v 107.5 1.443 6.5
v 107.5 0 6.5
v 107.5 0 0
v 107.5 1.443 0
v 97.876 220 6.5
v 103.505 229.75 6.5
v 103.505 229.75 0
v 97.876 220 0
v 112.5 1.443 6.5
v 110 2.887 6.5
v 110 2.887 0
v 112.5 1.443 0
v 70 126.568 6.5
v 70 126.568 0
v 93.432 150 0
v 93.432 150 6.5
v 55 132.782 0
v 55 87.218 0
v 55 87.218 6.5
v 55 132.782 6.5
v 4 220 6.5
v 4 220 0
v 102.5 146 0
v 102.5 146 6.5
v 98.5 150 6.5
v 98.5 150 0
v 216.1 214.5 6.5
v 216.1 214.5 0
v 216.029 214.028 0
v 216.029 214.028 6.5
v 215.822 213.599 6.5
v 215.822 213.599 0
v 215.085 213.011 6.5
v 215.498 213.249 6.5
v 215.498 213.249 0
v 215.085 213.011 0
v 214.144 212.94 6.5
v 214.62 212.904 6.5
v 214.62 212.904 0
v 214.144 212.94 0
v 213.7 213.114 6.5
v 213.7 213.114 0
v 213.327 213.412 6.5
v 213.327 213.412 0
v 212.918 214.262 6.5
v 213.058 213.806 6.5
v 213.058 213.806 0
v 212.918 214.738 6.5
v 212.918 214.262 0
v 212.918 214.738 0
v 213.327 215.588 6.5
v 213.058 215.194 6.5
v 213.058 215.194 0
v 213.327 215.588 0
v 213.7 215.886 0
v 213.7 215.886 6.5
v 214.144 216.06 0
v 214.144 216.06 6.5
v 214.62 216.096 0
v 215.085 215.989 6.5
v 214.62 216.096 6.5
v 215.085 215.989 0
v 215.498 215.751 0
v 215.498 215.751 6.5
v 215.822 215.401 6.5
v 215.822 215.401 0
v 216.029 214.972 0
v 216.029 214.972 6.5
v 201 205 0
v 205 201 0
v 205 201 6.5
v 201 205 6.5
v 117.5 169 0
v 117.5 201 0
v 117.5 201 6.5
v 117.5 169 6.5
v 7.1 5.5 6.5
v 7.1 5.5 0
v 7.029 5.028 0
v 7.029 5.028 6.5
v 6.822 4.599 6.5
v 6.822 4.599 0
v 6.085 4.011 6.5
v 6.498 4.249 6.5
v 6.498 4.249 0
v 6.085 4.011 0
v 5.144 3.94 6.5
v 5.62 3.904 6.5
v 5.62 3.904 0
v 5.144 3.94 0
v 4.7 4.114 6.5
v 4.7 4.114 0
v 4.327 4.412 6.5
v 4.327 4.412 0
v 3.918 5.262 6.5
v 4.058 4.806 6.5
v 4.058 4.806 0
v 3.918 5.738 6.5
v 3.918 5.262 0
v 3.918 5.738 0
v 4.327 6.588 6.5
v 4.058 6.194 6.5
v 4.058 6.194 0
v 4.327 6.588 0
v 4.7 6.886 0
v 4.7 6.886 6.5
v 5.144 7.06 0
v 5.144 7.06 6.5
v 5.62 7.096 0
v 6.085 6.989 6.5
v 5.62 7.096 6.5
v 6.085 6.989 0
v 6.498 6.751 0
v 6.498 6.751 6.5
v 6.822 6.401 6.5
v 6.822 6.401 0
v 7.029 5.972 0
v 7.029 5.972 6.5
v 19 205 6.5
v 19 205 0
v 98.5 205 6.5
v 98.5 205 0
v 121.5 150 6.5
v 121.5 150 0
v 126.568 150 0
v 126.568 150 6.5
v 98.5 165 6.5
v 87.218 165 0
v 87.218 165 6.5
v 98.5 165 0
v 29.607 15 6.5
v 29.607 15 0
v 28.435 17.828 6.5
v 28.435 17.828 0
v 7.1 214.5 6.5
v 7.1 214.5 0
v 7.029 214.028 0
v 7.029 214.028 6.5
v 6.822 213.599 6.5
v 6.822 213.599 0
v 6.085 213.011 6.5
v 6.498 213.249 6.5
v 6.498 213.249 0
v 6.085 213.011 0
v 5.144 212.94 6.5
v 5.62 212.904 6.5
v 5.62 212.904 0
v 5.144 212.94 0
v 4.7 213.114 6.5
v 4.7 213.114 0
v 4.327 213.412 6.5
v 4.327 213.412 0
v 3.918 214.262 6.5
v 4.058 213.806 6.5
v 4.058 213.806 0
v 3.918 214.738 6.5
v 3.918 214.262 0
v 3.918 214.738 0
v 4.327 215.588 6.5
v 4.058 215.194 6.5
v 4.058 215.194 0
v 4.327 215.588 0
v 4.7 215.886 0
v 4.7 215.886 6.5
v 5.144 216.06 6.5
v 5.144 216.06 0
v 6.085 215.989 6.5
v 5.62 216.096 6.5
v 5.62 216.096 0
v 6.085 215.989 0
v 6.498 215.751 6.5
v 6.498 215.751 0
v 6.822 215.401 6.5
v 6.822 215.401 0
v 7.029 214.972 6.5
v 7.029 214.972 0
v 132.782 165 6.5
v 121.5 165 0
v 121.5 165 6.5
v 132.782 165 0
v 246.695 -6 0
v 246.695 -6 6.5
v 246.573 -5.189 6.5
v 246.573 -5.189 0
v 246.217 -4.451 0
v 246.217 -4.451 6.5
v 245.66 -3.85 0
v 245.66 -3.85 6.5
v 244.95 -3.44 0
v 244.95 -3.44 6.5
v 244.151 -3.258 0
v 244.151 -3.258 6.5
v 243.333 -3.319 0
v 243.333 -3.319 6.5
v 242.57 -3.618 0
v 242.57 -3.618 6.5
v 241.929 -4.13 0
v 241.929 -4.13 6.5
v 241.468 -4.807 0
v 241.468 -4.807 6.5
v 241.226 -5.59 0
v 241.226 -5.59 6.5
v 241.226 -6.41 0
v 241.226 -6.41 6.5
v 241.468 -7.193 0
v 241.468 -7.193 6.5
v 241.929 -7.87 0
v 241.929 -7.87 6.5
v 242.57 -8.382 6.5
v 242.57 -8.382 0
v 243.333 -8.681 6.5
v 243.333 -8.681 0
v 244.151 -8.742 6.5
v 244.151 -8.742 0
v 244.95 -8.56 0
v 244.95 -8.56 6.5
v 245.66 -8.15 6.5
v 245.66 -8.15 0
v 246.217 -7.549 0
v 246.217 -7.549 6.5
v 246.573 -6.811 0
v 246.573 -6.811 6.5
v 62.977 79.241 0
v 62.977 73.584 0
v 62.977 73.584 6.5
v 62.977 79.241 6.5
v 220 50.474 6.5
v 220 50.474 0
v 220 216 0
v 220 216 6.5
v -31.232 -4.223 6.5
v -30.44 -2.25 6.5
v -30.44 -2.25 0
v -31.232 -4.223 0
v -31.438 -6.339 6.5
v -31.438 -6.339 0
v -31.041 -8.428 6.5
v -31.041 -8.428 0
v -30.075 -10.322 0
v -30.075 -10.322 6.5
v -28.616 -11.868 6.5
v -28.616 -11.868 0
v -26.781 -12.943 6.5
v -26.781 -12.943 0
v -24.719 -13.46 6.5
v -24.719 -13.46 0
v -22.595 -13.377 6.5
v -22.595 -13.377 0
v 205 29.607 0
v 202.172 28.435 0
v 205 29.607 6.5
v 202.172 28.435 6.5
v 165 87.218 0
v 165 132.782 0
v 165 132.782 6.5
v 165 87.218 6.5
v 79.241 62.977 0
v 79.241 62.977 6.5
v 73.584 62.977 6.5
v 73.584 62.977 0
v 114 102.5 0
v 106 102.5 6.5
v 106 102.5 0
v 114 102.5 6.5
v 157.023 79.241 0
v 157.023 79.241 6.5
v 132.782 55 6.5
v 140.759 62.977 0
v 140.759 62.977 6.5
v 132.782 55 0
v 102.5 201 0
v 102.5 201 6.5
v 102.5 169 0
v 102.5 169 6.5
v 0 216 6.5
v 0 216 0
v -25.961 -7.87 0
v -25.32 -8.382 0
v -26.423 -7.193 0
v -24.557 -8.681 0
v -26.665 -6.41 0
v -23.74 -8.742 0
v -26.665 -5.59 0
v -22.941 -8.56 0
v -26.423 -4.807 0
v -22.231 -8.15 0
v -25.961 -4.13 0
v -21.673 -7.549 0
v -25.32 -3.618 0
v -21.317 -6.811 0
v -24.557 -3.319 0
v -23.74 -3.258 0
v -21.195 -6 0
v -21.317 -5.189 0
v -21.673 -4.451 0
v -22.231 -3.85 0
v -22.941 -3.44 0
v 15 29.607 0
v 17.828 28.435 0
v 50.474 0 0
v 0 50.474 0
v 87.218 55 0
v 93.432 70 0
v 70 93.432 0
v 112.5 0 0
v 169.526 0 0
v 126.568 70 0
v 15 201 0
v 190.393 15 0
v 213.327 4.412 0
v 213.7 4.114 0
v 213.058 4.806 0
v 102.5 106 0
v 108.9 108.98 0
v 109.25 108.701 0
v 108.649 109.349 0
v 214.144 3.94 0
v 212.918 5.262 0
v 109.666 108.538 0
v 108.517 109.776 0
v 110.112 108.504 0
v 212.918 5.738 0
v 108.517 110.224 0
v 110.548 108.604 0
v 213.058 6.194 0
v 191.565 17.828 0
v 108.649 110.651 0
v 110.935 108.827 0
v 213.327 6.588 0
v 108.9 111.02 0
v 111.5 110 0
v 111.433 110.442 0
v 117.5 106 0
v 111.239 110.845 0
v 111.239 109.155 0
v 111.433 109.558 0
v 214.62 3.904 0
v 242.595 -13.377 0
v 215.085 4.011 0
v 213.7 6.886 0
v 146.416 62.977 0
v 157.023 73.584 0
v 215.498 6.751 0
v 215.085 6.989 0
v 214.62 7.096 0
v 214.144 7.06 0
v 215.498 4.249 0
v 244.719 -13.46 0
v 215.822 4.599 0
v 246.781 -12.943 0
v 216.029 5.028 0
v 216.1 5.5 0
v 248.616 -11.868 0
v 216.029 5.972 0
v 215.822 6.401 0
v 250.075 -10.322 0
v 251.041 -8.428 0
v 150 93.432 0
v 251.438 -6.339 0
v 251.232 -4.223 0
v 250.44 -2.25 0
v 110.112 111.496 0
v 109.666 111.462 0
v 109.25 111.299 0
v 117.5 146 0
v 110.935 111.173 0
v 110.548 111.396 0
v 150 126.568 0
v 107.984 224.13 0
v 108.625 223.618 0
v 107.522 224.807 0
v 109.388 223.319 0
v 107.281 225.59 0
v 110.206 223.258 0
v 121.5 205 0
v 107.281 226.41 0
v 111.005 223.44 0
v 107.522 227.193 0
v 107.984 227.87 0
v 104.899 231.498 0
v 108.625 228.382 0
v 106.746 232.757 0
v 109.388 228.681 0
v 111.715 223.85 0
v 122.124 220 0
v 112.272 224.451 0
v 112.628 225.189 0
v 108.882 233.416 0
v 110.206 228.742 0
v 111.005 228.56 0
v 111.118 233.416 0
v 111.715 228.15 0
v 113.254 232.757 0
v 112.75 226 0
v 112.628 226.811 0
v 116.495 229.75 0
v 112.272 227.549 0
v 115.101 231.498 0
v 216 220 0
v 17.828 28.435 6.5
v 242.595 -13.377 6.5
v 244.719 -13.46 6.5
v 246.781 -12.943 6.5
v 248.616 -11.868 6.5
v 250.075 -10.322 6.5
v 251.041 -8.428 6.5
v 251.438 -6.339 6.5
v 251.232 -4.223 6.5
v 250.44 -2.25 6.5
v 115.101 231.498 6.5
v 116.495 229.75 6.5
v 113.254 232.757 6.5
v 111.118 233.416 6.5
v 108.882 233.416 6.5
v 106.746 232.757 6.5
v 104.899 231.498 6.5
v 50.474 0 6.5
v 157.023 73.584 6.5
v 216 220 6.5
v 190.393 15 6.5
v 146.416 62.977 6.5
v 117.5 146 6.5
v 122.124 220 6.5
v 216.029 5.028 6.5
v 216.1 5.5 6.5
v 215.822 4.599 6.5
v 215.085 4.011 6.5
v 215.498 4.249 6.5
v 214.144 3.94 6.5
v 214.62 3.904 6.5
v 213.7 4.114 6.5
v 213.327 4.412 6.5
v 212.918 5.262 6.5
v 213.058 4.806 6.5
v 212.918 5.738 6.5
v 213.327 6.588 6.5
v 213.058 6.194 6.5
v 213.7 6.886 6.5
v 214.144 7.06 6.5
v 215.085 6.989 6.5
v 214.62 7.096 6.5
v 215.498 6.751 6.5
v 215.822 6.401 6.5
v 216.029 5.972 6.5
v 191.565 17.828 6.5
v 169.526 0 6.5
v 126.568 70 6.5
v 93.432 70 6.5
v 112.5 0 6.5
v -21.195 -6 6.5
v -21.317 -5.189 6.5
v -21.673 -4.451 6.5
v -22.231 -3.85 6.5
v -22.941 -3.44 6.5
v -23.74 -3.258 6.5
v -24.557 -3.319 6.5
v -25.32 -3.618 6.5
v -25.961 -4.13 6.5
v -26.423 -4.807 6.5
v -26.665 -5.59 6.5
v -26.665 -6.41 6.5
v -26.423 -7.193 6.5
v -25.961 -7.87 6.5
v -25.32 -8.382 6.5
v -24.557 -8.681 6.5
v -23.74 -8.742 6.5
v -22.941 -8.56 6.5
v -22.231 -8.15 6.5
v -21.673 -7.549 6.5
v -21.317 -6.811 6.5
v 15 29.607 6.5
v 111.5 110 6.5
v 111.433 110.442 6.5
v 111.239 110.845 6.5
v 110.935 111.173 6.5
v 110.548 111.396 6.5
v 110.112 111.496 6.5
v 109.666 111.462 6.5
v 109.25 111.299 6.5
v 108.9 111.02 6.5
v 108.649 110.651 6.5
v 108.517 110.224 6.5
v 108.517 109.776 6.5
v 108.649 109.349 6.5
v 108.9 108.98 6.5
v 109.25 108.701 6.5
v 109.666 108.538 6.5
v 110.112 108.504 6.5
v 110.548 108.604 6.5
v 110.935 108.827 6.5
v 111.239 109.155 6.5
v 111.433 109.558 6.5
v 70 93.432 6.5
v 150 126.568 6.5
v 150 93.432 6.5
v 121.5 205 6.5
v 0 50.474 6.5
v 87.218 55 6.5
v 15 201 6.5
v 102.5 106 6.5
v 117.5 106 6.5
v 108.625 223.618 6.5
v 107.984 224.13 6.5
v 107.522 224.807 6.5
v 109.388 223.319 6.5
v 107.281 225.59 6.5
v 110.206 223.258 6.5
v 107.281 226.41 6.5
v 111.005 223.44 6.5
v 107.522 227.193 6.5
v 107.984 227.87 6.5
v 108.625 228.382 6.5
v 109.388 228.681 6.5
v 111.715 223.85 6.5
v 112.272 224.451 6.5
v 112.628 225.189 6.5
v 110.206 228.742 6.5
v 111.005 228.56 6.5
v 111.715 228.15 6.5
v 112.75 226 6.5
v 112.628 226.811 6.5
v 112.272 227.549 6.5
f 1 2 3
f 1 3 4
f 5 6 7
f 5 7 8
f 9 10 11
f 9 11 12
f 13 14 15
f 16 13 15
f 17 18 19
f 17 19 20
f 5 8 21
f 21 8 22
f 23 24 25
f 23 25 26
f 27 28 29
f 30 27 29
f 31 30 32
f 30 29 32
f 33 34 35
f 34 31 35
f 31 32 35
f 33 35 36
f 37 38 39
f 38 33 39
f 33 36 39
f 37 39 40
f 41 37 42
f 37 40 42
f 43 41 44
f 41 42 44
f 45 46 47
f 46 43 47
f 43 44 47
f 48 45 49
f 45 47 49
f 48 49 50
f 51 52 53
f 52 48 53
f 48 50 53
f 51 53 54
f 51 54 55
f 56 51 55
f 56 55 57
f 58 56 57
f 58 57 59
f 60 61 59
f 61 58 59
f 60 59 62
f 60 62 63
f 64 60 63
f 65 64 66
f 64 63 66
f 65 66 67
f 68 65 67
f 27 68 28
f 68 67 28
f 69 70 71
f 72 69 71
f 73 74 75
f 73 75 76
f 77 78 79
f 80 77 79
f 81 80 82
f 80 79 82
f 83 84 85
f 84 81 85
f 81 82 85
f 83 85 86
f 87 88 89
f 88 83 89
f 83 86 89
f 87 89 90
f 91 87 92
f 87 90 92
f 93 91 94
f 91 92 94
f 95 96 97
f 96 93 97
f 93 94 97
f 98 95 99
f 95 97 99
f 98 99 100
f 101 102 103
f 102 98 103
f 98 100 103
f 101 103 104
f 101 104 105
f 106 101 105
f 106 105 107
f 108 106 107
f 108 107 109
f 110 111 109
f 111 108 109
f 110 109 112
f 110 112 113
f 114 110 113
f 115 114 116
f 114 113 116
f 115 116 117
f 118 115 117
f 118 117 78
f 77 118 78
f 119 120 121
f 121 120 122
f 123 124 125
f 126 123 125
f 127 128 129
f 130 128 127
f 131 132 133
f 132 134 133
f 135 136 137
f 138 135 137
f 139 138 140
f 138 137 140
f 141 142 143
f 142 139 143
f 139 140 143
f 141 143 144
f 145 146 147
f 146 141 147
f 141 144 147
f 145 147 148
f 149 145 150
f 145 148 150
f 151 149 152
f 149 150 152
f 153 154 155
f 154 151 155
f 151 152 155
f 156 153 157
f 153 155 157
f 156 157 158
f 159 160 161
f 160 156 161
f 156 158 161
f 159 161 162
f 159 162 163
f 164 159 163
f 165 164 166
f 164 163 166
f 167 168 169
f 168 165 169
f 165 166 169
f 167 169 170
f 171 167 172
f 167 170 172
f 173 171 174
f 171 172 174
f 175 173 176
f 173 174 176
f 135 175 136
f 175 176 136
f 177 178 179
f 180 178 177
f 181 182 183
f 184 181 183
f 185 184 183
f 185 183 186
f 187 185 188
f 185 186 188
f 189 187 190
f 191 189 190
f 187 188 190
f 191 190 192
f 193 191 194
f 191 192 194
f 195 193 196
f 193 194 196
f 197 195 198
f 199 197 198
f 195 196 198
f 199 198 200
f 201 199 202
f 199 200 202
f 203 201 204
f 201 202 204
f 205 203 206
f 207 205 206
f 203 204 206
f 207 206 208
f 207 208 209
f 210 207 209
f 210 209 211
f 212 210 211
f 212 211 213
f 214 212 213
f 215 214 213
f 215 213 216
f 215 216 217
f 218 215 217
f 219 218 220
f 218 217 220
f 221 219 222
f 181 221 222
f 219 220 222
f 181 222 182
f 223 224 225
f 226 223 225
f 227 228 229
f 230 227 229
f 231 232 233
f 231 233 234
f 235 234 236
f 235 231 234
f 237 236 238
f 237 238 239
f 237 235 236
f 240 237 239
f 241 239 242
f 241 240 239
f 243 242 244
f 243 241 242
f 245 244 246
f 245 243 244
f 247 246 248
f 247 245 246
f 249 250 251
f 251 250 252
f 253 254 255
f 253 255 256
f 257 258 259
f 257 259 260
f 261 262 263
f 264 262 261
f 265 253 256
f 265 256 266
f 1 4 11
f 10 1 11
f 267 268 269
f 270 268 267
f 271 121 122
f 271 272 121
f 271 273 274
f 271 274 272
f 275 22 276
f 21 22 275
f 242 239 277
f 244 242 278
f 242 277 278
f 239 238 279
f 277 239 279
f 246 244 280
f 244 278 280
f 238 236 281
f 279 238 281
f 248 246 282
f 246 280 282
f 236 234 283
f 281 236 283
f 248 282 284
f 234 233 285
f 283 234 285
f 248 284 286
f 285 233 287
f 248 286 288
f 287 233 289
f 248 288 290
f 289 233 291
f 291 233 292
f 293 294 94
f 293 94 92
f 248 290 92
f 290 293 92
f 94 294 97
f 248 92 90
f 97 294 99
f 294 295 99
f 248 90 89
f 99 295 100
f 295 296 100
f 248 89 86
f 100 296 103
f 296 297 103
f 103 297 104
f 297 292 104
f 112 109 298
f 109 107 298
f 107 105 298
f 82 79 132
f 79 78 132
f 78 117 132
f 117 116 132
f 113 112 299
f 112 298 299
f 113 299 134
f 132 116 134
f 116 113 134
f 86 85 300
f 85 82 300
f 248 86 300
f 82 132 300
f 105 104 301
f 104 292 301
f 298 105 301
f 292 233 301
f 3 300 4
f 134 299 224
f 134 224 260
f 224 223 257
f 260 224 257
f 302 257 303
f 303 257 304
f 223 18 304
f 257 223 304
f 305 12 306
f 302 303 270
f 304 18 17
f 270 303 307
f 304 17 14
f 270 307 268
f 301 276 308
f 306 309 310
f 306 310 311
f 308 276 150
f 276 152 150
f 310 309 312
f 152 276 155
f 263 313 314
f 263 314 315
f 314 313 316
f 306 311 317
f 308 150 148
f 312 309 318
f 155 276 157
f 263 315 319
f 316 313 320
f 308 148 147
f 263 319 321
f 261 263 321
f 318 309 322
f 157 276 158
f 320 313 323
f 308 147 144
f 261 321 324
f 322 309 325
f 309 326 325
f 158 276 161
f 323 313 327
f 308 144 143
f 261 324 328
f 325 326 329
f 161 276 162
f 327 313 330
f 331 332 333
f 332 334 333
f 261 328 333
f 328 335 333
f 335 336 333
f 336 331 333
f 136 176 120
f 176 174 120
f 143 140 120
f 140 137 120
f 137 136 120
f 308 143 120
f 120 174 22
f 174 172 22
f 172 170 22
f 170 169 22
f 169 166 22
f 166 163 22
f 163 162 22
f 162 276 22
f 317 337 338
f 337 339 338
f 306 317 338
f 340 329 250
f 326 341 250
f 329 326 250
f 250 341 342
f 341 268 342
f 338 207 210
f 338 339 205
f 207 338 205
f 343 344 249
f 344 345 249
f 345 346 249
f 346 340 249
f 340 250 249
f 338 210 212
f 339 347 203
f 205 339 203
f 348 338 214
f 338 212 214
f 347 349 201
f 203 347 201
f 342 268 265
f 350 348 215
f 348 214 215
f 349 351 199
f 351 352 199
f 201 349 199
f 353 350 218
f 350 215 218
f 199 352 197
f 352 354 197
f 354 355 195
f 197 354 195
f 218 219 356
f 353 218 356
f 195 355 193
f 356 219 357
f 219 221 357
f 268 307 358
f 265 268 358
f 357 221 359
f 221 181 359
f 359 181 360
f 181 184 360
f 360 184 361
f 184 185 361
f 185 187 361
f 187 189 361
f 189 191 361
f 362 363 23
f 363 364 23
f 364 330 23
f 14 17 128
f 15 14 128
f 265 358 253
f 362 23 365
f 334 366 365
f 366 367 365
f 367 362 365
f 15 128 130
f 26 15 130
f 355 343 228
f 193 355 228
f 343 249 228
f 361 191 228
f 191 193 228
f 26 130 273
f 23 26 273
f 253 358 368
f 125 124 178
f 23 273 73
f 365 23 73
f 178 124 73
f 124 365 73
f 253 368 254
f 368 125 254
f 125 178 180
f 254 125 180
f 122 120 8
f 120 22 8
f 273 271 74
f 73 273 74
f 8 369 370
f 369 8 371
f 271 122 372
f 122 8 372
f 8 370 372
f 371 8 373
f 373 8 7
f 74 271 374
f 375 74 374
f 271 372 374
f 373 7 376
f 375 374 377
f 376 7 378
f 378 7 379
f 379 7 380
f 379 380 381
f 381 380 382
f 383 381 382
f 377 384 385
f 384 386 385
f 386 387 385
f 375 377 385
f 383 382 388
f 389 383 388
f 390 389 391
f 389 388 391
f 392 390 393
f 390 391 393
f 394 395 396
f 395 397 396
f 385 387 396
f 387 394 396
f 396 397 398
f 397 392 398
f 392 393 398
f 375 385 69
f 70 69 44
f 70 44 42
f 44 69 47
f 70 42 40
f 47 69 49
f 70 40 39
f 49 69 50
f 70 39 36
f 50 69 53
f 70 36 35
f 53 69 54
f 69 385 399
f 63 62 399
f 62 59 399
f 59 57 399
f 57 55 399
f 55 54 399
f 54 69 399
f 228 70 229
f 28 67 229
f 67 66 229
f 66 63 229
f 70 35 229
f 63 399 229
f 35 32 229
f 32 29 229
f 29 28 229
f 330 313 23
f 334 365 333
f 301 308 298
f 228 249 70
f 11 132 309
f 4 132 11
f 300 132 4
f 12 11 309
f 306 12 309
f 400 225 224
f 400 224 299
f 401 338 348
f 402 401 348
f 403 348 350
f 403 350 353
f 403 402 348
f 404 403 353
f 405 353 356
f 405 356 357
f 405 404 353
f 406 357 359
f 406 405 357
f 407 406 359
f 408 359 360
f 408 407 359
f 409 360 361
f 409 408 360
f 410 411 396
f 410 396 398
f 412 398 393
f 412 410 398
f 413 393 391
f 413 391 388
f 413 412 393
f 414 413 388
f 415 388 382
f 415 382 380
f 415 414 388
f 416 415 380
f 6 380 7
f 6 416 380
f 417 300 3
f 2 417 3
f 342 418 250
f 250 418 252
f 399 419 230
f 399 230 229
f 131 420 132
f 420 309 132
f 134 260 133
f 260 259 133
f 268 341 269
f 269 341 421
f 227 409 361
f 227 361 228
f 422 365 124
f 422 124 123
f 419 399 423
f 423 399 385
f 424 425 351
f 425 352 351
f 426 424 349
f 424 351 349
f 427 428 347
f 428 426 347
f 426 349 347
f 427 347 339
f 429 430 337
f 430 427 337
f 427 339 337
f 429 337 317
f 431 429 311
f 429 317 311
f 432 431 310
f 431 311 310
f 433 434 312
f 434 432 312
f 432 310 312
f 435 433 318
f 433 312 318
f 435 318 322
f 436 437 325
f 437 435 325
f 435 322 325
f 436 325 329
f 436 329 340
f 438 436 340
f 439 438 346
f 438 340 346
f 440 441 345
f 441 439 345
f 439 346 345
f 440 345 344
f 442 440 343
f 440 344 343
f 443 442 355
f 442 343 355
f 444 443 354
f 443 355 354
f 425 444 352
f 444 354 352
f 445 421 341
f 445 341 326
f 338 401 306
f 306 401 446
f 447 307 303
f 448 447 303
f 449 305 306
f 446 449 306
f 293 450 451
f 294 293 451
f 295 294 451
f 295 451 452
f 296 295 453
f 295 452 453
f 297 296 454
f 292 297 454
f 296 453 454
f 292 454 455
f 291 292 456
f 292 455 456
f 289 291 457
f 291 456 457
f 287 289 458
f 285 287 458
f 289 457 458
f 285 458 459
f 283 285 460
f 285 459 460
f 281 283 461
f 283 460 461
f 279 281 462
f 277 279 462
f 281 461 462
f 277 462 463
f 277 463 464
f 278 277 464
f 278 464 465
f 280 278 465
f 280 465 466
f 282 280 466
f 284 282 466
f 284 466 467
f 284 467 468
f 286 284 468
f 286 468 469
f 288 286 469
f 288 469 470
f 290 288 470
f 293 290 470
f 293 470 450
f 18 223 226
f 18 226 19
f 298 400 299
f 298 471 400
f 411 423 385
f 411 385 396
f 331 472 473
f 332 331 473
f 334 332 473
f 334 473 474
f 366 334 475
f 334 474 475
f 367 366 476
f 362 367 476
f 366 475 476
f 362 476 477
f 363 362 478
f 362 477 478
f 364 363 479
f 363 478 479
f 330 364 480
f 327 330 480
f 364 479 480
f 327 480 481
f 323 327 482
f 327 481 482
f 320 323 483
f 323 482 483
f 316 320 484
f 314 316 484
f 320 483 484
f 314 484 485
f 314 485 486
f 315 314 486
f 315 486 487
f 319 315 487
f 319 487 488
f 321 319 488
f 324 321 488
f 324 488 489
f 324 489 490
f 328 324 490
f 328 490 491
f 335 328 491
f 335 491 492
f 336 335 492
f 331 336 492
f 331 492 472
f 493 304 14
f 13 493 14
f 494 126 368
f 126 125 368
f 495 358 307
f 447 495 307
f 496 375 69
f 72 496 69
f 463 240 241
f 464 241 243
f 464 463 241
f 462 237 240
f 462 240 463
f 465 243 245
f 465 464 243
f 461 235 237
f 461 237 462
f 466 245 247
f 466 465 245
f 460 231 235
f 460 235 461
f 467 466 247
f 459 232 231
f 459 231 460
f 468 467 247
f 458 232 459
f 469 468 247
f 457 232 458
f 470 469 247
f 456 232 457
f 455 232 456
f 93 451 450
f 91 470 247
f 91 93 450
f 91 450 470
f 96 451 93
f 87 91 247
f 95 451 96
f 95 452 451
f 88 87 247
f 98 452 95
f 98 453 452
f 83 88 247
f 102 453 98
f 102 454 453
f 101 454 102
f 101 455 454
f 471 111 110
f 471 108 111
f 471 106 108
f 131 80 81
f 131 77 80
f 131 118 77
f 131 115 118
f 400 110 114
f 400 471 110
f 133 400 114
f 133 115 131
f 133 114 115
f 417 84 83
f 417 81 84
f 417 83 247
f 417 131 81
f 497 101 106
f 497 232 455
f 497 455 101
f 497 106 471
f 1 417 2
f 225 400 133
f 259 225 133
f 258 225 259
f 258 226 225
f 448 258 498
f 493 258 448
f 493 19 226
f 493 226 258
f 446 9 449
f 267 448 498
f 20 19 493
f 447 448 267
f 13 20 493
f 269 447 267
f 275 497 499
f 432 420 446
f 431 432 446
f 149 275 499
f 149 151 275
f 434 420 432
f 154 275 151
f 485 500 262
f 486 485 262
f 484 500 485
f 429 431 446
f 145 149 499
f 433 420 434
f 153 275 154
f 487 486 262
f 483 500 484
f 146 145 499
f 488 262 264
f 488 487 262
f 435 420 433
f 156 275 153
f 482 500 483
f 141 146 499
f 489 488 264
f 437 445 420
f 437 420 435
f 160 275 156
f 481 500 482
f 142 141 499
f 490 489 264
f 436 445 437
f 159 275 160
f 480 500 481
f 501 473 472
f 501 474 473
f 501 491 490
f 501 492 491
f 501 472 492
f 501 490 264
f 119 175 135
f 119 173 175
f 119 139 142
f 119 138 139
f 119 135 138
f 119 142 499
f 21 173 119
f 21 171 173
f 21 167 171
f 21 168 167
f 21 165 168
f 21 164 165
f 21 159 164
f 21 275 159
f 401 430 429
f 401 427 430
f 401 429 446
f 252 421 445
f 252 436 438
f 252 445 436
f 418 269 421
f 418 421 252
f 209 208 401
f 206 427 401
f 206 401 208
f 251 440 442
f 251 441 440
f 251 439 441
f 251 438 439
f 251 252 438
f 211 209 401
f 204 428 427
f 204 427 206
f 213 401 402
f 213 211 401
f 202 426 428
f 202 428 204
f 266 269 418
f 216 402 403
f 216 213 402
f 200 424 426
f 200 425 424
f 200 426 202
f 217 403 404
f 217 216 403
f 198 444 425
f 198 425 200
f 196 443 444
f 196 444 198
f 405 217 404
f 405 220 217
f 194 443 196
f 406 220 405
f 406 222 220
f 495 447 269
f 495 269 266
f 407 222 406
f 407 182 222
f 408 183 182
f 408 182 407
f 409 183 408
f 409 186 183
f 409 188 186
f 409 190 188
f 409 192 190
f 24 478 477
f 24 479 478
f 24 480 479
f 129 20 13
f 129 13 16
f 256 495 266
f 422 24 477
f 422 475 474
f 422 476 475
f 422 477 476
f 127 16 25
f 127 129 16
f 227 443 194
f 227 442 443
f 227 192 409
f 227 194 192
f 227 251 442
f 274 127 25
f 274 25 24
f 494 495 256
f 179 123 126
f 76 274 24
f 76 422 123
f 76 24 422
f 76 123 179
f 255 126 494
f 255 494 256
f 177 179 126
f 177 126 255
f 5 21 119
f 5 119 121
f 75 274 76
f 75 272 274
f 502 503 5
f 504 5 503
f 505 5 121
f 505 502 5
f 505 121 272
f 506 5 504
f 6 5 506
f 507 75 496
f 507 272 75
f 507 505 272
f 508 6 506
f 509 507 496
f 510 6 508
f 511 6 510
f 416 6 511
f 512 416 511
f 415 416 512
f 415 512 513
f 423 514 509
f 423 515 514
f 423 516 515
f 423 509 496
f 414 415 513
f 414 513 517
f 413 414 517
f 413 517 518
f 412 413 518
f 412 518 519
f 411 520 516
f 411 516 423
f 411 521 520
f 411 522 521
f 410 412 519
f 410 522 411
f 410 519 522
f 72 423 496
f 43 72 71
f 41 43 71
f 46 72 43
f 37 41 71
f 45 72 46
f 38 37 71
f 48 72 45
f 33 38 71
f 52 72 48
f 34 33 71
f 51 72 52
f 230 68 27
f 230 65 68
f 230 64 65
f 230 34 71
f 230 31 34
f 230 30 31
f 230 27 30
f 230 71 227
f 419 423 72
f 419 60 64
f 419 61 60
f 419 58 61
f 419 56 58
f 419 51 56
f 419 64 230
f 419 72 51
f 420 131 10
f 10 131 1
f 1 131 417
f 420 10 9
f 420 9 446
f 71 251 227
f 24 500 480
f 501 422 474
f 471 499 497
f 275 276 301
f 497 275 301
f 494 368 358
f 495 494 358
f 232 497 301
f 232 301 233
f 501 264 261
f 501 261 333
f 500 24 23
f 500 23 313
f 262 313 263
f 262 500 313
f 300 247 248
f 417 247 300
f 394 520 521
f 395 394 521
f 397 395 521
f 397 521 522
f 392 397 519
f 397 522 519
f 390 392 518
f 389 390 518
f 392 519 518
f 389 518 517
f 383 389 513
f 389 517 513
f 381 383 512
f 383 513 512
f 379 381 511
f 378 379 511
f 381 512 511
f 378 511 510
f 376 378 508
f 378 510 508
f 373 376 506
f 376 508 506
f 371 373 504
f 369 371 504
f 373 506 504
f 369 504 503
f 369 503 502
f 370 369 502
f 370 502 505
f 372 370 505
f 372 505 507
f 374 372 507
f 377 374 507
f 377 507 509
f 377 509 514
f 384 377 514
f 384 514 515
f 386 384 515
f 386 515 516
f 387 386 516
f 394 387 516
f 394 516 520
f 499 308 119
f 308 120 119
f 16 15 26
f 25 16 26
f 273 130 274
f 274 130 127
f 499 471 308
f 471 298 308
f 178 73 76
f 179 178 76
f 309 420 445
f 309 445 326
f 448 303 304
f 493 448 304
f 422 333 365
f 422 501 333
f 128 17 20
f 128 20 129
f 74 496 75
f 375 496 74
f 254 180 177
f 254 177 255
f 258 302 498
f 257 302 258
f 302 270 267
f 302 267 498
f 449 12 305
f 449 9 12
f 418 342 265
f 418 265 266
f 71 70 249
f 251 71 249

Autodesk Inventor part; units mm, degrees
ref_plane "YZ Plane" through (0, 0, 0) normal (1, 0, 0) x (0, 1, 0)
ref_plane "XZ Plane" through (0, 0, 0) normal (0, 1, 0) x (-1, 0, 0)
ref_plane "XY Plane" through (0, 0, 0) normal (0, 0, 1) x (1, 0, 0)
sketch "Sketch1" plane through (0, 0, 0) normal (0, 0, 1) x (1, 0, 0)
  line L0 (0, 0) -> (220, 0)
  line L1 (220, 0) -> (220, 220)
  line L2 (220, 220) -> (0, 220)
  line L3 (0, 220) -> (0, 0)
  line L4 (5.5, 214.5) -> (214.5, 214.5) construction
  line L5 (214.5, 214.5) -> (214.5, 5.5) construction
  line L6 (214.5, 5.5) -> (5.5, 5.5) construction
  line L7 (5.5, 5.5) -> (5.5, 214.5) construction
  circle A0 centre (5.5, 5.5) radius 1.6
  circle A1 centre (5.5, 214.5) radius 1.6
  circle A2 centre (214.5, 214.5) radius 1.6
  circle A3 centre (214.5, 5.5) radius 1.6
  line L8 (165, 87.2183) -> (132.7817, 55)
  line L9 (132.7817, 55) -> (87.2183, 55)
  line L10 (87.2183, 55) -> (55, 87.2183)
  line L11 (55, 87.2183) -> (55, 132.7817)
  line L12 (55, 132.7817) -> (87.2183, 165)
  line L13 (132.7817, 165) -> (165, 132.7817)
  line L14 (165, 132.7817) -> (165, 87.2183)
  line L15 (150, 126.5685) -> (150, 93.4315)
  line L16 (150, 93.4315) -> (126.5685, 70)
  line L17 (126.5685, 70) -> (93.4315, 70)
  line L18 (93.4315, 70) -> (70, 93.4315)
  line L19 (70, 93.4315) -> (70, 126.5685)
  line L20 (70, 126.5685) -> (93.4315, 150)
  line L21 (93.4315, 150) -> (126.5685, 150)
  line L22 (126.5685, 150) -> (150, 126.5685)
  line L23 (205, 205) -> (205, 15)
  line L24 (205, 15) -> (15, 15)
  line L25 (15, 15) -> (15, 205)
  line L26 (102.5, 165) -> (102.5, 205)
  line L27 (117.5, 205) -> (117.5, 165)
  line L28 (15, 205) -> (102.5, 205)
  line L29 (117.5, 205) -> (205, 205)
  line L30 (87.2183, 165) -> (102.5, 165)
  line L31 (117.5, 165) -> (132.7817, 165)
  point P0 (214.5, 110)
  point P1 (220, 110)
  point P2 (110, 214.5)
  point P3 (110, 220)
  point P4 (110, 110)
  point P5 (110, 110)
  dimension "d0" = 220
  dimension "d1" = 220
  dimension "d2" = 209
  dimension "d3" = 209
  dimension "d4" = 3.2
  dimension "d5" = 3.2
  dimension "d6" = 3.2
  dimension "d7" = 3.2
  dimension "d9" = 15
  dimension "d10" = 15
  dimension "d11" = 15
  dimension "d12" = 15
  dimension "d13" = 15
  dimension "d14" = 80
  dimension "d15" = 7.5
extrude "Extrusion1" add sketch "Sketch1" along normal blind 6.5
sketch "Sketch2" plane through (0, 0, 6.5) normal (0, 0, 1) x (1, 0, 0)
  line L0 (205, 205) -> (205, 15) projected
  line L1 (205, 15) -> (15, 15) projected
  line L2 (15, 15) -> (15, 205) projected
  line L3 (55, 87.2183) -> (87.2183, 55) projected
  line L4 (132.7817, 55) -> (165, 87.2183) projected
  line L5 (0, 220) -> (0, 0) projected
  line L6 (65.8058, 76.4124) -> (15, 25.6066)
  line L7 (76.4124, 65.8058) -> (25.6066, 15)
  line L8 (143.5876, 65.8058) -> (194.3934, 15)
  line L9 (154.1942, 76.4124) -> (205, 25.6066)
  line L10 (205, 25.6066) -> (205, 15)
  line L11 (205, 15) -> (194.3934, 15)
  line L12 (15, 25.6066) -> (15, 15)
  line L13 (15, 15) -> (25.6066, 15)
  line L14 (15, 15) -> (71.1091, 71.1091) construction
  line L15 (148.8909, 71.1091) -> (205, 15) construction
  line L16 (65.8058, 76.4124) -> (76.4124, 65.8058)
  line L17 (143.5876, 65.8058) -> (154.1942, 76.4124)
  dimension "d18" = 15
  dimension "d19" = 15
  dimension "d20" = 7.5
  dimension "d21" = 7.5
extrude "Extrusion2" add sketch "Sketch2" against normal blind 6.5
sketch "Sketch4" plane through (0, 0, 6.5) normal (0, 0, 1) x (1, 0, 0)
  line L0 (93.4315, 150) -> (126.5685, 150) projected
  line L1 (0, 0) -> (220, 0) projected
  line L2 (220, 0) -> (220, 220) projected
  line L3 (220, 220) -> (0, 220) projected
  line L4 (0, 220) -> (0, 0) projected
  line L5 (-23.9453, -6) -> (243.9453, -6) construction
  line L6 (-23.9453, -6) -> (110, 226) construction
  line L7 (110, 226) -> (243.9453, -6) construction
  circle A0 centre (110, 226) radius 2.75
  circle A1 centre (243.9453, -6) radius 2.75
  circle A2 centre (-23.9453, -6) radius 2.75
  arc A3 (-30.4405, -2.25) -> (-22.5946, -13.3774) centre (-23.9453, -6) ccw
  arc A4 (116.4952, 229.75) -> (103.5048, 229.75) centre (110, 226) ccw
  arc A5 (242.5946, -13.3774) -> (250.4405, -2.25) centre (243.9453, -6) ccw
  line L8 (122.1244, 220) -> (116.4952, 229.75)
  line L9 (103.5048, 229.75) -> (97.8756, 220)
  line L10 (0, 50.4744) -> (-30.4405, -2.25)
  line L11 (250.4405, -2.25) -> (220, 50.4744)
  line L12 (242.5946, -13.3774) -> (169.5256, 0)
  line L13 (-22.5946, -13.3774) -> (50.4744, 0)
  line L14 (0, 50.4744) -> (0, 0)
  line L15 (0, 0) -> (50.4744, 0)
  line L16 (169.5256, 0) -> (220, 0)
  line L17 (220, 50.4744) -> (220, 0)
  point P0 (110, 150)
  dimension "d30" = 5.5
  dimension "d31" = 5.5
  dimension "d32" = 5.5
  dimension "d33" = 15
  dimension "d34" = 15
  dimension "d35" = 15
  dimension "d36" = 6
  dimension "d37" = 6
extrude "Extrusion3" add sketch "Sketch4" against normal blind 6.5 contours L1 L13 A3 L10 L4 | L1 L2 L11 A5 L12 | L9 A4 L8 L3
chamfer "Chamfer1" distance 4 angle 45 16 edges at (25.6066, 15, 3.25) (15, 25.6066, 3.25) (76.4124, 65.8058, 3.25) (65.8058, 76.4124, 3.25) (194.3934, 15, 3.25) (205, 25.6066, 3.25) (143.5876, 65.8058, 3.25) (154.1942, 76.4124, 3.25) (117.5, 205, 3.25) (102.5, 205, 3.25) (117.5, 165, 3.25) (102.5, 165, 3.25) (205, 205, 3.25) (15, 205, 3.25) (0, 220, 3.25) (220, 220, 3.25)
sketch "Sketch5" plane through (0, 0, 6.5) normal (0, 0, 1) x (1, 0, 0)
  line L0 (117.5, 169) -> (117.5, 201) projected
  line L1 (28.435, 17.8284) -> (29.6066, 15) projected
  line L2 (15, 29.6066) -> (17.8284, 28.435) projected
  line L3 (102.5, 201) -> (102.5, 169) projected
  line L4 (93.4315, 150) -> (126.5685, 150) projected
  line L5 (0, 216) -> (4, 220) projected
  line L6 (220, 50.4744) -> (220, 216) projected
  line L7 (70, 126.5685) -> (150, 93.4315) construction
  line L8 (150, 126.5685) -> (70, 93.4315) construction
  line L9 (102.5, 150) -> (102.5, 106)
  line L10 (102.5, 106) -> (106, 102.5)
  line L11 (106, 102.5) -> (114, 102.5)
  line L12 (114, 102.5) -> (117.5, 106)
  line L13 (117.5, 106) -> (117.5, 150)
  circle A0 centre (110, 110) radius 1.5
  point P0 (0, 0)
  dimension "d43" = 3
  dimension "d44" = 8
  dimension "d45" = 7.5
  dimension "d46" = 7.5
extrude "Extrusion4" add sketch "Sketch5" against normal blind 6.5
chamfer "Chamfer2" distance 4 angle 45 2 edges at (102.5, 150, 3.25) (117.5, 150, 3.25)
sketch "Sketch6" plane through (0, 0, 6.5) normal (0, 0, 1) x (1, 0, 0)
  line L0 (50.4744, 0) -> (169.5256, 0) projected
  line L1 (107.5, 0) -> (107.5, 1.4434)
  line L2 (107.5, 1.4434) -> (110, 2.8868)
  line L3 (110, 2.8868) -> (112.5, 1.4434)
  line L4 (112.5, 1.4434) -> (112.5, 0)
  line L5 (107.5, 0) -> (112.5, 0)
  point P0 (0, 0)
  point P1 (110, 0)
  dimension "d52" = 5
extrude "Extrusion5" cut sketch "Sketch6" against normal through all
equation "\"d5\" = d4"
equation "\"d6\" = d4"
equation "\"d7\" = d4"
equation "\"d31\" = d30"
equation "\"d32\" = d30"
equation "\"d34\" = d33"
equation "\"d35\" = d33"
equation "\"d46\" = d45"
properties part number "heatbed_mount_v3" material "Plywood, Finish"
